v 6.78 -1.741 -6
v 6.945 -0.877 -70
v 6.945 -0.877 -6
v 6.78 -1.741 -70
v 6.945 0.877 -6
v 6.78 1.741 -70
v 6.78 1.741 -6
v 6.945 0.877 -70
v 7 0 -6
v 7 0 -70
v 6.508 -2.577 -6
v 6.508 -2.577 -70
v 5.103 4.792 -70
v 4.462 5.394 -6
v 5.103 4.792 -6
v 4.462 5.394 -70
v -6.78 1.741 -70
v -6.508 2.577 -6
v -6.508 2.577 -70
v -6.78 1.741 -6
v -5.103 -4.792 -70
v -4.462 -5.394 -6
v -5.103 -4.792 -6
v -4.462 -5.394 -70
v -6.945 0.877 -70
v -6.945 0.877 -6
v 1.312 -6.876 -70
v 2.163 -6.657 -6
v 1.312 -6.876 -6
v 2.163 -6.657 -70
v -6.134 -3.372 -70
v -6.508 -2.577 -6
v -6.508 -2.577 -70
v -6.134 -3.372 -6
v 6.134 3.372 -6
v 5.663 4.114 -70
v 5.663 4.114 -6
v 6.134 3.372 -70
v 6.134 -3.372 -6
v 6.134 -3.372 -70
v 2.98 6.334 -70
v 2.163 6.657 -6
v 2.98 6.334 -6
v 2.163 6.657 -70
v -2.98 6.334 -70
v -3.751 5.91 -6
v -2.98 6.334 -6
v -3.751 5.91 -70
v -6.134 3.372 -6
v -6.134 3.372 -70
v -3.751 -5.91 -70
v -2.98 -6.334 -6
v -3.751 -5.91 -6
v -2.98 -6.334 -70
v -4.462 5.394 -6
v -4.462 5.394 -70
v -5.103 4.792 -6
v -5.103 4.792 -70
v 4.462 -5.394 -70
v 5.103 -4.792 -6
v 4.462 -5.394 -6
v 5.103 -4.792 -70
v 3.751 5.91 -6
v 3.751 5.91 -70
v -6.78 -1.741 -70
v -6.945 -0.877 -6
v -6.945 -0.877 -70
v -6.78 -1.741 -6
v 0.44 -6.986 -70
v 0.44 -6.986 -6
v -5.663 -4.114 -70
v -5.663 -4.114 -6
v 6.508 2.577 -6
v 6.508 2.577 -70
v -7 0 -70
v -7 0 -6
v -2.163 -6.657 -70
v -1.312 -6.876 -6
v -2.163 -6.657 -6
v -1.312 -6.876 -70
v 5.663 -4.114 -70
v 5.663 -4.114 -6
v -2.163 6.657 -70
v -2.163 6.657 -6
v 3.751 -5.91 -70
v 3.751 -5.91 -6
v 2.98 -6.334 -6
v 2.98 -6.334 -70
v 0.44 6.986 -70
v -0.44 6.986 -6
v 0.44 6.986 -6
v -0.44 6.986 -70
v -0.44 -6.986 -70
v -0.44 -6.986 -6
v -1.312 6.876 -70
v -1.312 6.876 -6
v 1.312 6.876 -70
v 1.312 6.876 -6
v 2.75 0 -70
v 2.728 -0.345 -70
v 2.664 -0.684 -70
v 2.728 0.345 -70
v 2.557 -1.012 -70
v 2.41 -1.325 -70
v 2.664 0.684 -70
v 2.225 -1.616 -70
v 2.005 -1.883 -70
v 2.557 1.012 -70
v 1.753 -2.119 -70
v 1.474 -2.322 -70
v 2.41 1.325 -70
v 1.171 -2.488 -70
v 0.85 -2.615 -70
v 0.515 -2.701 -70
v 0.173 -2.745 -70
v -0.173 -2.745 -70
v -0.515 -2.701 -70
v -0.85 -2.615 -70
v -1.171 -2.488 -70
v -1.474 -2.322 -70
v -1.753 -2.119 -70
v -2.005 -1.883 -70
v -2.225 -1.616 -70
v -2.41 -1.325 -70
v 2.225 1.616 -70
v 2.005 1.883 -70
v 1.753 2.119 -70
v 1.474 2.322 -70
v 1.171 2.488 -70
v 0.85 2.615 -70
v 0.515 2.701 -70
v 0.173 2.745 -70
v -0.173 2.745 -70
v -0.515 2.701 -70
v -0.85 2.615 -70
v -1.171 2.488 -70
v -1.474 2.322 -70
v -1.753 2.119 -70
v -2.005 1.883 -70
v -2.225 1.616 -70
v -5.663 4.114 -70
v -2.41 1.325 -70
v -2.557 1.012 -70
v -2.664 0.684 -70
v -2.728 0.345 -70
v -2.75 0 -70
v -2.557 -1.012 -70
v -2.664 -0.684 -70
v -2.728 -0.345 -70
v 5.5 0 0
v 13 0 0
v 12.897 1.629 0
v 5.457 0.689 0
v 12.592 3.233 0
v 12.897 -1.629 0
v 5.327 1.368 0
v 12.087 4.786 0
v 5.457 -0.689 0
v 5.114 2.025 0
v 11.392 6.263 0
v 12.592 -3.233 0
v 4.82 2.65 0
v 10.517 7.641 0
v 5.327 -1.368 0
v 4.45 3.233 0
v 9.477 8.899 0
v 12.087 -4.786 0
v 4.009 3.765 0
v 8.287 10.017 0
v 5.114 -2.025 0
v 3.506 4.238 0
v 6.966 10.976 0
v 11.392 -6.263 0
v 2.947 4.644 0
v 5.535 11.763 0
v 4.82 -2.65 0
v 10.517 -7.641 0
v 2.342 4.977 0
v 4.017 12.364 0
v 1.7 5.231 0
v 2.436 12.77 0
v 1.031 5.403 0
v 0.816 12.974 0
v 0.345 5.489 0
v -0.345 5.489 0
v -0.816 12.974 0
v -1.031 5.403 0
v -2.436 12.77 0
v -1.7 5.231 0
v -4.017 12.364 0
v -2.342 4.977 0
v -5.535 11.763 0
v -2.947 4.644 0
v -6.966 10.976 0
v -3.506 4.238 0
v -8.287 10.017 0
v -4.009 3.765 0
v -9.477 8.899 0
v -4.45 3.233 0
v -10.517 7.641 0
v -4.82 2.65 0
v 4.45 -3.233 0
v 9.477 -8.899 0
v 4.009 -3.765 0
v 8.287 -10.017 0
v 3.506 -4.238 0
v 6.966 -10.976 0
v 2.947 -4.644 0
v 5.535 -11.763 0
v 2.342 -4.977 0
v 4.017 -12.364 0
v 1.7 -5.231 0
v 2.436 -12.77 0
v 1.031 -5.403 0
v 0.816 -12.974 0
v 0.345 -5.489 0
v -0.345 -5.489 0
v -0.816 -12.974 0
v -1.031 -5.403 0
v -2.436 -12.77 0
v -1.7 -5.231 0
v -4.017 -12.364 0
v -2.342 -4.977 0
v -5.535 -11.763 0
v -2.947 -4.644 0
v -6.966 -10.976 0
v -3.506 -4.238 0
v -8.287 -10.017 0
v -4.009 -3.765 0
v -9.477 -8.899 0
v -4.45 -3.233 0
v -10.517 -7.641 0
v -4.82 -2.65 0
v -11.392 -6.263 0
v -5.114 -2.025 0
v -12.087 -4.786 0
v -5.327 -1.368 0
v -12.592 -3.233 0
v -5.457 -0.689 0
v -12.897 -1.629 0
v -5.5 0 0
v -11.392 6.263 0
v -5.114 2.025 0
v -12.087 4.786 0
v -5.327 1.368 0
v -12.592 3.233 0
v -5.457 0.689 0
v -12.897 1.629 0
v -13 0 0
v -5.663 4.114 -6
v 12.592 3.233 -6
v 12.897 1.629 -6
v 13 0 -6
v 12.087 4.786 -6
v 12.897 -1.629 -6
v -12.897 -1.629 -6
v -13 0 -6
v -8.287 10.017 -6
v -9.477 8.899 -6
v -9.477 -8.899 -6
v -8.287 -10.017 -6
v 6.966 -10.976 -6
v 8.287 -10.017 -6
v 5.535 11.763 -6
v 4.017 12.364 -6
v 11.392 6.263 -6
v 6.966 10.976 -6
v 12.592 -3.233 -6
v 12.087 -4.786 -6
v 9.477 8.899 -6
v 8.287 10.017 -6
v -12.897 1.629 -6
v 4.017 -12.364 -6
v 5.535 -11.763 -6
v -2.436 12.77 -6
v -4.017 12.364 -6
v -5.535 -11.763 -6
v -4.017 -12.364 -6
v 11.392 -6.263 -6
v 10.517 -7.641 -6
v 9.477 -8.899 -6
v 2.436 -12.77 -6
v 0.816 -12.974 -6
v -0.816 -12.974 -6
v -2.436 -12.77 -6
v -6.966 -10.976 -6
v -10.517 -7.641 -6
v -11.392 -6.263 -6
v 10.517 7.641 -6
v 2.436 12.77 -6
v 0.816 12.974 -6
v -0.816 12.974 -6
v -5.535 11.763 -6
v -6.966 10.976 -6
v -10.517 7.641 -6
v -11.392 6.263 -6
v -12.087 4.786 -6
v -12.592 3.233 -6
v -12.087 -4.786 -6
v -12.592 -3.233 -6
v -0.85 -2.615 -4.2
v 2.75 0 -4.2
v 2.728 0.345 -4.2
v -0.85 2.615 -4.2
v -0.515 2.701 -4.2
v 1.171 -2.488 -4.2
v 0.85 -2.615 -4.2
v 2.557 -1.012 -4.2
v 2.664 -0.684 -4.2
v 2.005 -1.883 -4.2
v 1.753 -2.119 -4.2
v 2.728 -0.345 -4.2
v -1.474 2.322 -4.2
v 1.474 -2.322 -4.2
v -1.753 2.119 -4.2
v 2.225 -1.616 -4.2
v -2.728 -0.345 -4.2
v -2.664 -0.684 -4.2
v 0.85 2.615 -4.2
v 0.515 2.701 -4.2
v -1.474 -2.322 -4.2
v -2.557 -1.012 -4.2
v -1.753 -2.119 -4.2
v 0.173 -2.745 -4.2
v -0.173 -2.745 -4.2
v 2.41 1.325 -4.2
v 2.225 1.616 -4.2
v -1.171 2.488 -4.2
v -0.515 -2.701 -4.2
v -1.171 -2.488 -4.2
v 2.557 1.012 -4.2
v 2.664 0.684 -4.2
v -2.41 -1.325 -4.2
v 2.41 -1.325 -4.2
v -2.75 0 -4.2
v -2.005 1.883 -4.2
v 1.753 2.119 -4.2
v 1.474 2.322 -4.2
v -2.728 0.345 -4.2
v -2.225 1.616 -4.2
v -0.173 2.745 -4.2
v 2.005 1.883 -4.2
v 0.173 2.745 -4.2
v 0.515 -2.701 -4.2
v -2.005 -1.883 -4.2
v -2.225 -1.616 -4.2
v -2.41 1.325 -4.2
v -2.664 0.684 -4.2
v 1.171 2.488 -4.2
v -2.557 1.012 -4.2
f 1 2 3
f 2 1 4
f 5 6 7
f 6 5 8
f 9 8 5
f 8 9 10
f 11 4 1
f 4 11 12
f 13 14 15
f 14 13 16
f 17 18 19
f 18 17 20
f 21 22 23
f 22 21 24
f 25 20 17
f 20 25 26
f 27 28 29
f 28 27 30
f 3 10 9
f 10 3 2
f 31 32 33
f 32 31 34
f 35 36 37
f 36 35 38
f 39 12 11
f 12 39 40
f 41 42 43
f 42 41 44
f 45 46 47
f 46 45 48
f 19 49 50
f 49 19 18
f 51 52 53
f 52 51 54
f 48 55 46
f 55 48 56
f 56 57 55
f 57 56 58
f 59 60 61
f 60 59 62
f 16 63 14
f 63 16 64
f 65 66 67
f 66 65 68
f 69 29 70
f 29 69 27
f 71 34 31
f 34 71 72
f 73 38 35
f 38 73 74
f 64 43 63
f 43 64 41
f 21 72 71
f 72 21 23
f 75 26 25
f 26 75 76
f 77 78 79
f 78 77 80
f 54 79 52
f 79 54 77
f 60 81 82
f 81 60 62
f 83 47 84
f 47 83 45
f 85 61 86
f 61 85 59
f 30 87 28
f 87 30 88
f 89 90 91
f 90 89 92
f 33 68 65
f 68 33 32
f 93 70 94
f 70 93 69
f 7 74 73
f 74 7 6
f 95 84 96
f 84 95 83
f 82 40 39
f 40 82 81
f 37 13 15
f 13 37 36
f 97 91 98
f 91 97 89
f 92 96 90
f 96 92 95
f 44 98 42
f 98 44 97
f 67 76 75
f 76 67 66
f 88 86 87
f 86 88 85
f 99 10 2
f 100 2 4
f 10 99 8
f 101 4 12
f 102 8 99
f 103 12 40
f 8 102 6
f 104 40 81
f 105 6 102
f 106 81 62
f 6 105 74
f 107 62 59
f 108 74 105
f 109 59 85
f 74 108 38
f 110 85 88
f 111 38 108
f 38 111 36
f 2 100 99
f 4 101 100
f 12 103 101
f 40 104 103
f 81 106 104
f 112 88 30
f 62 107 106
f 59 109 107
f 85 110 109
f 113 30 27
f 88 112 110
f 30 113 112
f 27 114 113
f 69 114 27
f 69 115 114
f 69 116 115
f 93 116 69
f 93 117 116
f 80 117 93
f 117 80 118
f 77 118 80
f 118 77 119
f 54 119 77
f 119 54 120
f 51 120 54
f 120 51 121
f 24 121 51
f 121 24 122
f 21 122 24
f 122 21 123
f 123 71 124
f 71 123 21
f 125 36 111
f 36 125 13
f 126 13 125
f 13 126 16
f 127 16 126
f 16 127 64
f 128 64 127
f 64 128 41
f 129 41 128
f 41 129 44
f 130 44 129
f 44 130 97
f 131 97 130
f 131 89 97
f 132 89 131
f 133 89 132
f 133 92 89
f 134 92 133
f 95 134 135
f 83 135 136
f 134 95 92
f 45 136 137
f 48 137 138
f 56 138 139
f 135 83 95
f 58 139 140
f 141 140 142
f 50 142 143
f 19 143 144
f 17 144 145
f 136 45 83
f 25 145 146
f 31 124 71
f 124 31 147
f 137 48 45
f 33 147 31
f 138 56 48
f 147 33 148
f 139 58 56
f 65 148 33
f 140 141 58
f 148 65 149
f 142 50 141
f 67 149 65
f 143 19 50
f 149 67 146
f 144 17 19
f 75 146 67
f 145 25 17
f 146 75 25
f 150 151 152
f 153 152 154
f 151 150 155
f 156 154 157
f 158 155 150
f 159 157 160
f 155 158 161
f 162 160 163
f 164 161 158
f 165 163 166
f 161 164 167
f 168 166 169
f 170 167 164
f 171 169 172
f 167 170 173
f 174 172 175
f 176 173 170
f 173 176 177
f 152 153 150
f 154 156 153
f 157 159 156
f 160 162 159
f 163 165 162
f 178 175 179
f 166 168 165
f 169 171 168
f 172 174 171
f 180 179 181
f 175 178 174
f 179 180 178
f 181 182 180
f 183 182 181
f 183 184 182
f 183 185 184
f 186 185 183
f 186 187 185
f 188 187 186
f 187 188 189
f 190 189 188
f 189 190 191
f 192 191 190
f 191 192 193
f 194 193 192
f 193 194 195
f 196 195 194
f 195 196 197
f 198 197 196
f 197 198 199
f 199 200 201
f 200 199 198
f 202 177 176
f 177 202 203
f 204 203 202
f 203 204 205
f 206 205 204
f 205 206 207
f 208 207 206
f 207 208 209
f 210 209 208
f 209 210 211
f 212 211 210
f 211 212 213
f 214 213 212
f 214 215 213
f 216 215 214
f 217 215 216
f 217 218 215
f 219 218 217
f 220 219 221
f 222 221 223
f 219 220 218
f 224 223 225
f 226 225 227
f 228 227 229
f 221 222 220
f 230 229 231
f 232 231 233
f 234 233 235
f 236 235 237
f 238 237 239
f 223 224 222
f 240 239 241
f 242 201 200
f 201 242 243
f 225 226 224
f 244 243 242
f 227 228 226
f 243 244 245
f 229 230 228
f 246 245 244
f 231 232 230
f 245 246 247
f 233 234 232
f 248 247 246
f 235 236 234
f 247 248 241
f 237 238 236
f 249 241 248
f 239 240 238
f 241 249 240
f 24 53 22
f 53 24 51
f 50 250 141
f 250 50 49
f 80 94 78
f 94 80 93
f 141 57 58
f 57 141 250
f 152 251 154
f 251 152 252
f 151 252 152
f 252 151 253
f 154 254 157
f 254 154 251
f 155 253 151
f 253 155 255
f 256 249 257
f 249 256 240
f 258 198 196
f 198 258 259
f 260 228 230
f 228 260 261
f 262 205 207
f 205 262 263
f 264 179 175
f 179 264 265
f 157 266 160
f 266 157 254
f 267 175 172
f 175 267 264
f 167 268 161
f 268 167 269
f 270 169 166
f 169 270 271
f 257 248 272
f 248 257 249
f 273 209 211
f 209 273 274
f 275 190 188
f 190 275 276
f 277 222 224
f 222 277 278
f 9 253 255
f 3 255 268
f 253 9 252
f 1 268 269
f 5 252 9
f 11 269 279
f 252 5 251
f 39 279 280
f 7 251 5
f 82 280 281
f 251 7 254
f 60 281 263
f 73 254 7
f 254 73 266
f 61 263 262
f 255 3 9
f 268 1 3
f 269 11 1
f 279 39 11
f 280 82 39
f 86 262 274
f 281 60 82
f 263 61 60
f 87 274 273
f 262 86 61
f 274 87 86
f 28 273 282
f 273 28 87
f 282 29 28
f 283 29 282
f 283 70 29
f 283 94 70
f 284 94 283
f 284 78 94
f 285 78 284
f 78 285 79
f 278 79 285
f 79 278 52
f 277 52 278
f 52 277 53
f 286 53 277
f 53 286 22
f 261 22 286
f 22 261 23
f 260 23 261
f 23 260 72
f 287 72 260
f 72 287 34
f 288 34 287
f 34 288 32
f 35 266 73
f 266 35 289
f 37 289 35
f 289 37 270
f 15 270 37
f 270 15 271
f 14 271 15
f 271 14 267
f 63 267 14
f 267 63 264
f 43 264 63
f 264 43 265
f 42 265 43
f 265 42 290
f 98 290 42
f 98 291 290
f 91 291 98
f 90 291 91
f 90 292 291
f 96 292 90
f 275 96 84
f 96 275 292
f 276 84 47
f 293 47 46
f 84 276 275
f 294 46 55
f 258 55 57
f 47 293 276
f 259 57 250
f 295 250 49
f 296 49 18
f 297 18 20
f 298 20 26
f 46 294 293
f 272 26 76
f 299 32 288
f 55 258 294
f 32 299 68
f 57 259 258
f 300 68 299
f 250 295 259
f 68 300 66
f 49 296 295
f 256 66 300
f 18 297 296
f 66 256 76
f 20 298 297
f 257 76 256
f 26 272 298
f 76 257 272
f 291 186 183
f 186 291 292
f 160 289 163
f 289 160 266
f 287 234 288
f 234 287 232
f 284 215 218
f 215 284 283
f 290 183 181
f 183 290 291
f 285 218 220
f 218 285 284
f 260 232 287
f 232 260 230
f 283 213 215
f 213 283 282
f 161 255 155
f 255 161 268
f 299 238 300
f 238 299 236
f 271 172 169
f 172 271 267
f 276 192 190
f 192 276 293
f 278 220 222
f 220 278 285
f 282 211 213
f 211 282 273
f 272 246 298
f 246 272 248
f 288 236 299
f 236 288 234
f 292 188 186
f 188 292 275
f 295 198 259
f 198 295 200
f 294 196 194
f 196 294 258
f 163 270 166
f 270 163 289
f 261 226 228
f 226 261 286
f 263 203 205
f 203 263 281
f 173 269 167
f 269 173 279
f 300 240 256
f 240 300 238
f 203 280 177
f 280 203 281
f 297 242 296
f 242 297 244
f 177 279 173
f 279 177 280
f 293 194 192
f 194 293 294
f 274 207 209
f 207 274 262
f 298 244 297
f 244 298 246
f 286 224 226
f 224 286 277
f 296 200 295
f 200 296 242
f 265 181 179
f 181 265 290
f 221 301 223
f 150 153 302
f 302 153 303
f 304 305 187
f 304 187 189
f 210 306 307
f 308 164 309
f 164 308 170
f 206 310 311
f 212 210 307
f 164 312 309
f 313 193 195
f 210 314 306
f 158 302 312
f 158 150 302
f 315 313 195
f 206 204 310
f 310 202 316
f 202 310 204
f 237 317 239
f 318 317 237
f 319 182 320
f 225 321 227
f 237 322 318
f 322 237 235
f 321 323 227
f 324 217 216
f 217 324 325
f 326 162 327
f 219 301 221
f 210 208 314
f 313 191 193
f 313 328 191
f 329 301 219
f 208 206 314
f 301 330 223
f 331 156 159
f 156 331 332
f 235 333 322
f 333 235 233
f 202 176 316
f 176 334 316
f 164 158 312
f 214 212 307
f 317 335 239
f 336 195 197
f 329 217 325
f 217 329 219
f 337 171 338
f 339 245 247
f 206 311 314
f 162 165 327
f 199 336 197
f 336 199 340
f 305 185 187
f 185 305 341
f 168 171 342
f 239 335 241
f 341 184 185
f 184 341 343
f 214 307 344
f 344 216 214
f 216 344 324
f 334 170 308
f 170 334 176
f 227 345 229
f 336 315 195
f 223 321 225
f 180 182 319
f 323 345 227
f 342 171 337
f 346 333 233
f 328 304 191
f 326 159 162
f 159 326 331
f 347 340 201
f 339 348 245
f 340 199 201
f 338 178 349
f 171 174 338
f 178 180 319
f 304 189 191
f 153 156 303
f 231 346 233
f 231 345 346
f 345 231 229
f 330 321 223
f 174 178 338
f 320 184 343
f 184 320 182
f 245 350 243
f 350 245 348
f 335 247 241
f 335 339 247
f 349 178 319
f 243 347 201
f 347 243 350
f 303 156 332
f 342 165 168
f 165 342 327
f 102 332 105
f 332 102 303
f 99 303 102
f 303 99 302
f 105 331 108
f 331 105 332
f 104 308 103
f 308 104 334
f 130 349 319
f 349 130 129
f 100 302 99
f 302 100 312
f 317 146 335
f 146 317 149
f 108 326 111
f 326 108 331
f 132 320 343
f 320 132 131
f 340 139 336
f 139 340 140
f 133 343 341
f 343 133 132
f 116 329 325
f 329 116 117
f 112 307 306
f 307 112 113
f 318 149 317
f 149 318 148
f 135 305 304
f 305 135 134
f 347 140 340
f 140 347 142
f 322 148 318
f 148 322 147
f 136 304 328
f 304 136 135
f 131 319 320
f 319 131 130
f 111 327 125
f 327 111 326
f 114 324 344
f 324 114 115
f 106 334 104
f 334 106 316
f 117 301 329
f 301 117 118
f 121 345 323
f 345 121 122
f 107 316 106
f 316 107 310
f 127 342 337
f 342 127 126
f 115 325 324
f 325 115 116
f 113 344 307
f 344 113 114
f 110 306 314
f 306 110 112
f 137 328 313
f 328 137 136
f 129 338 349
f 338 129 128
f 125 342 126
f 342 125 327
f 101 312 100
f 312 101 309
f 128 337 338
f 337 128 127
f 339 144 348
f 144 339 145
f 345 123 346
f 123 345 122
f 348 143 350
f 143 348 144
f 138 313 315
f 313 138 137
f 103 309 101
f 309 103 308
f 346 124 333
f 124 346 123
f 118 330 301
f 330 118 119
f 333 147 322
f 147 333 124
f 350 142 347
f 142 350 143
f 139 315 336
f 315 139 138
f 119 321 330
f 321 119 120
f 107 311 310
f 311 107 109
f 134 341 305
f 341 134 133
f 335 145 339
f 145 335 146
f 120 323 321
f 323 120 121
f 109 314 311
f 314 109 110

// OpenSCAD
$fn = 50;


difference() {
	union() {
		translate(v = [0, 0, -70.0000000000]) {
			cylinder(h = 70, r = 7.0000000000);
		}
		translate(v = [0, 0, -6.0000000000]) {
			cylinder(h = 6, r = 13.0000000000);
		}
	}
	union() {
		translate(v = [0, 0, 0]) {
			rotate(a = [0, 0, 0]) {
				difference() {
					union() {
						#translate(v = [0, 0, -70.0000000000]) {
							cylinder(h = 70, r = 2.2500000000);
						}
						#translate(v = [0, 0, -4.2000000000]) {
							cylinder(h = 4.2000000000, r = 7.0000000000, r1 = 2.7500000000, r2 = 5.5000000000);
						}
						#translate(v = [0, 0, -70.0000000000]) {
							cylinder(h = 70, r = 2.7500000000);
						}
						#translate(v = [0, 0, -70.0000000000]) {
							cylinder(h = 70, r = 2.2500000000);
						}
					}
					union();
				}
			}
		}
	}
}
